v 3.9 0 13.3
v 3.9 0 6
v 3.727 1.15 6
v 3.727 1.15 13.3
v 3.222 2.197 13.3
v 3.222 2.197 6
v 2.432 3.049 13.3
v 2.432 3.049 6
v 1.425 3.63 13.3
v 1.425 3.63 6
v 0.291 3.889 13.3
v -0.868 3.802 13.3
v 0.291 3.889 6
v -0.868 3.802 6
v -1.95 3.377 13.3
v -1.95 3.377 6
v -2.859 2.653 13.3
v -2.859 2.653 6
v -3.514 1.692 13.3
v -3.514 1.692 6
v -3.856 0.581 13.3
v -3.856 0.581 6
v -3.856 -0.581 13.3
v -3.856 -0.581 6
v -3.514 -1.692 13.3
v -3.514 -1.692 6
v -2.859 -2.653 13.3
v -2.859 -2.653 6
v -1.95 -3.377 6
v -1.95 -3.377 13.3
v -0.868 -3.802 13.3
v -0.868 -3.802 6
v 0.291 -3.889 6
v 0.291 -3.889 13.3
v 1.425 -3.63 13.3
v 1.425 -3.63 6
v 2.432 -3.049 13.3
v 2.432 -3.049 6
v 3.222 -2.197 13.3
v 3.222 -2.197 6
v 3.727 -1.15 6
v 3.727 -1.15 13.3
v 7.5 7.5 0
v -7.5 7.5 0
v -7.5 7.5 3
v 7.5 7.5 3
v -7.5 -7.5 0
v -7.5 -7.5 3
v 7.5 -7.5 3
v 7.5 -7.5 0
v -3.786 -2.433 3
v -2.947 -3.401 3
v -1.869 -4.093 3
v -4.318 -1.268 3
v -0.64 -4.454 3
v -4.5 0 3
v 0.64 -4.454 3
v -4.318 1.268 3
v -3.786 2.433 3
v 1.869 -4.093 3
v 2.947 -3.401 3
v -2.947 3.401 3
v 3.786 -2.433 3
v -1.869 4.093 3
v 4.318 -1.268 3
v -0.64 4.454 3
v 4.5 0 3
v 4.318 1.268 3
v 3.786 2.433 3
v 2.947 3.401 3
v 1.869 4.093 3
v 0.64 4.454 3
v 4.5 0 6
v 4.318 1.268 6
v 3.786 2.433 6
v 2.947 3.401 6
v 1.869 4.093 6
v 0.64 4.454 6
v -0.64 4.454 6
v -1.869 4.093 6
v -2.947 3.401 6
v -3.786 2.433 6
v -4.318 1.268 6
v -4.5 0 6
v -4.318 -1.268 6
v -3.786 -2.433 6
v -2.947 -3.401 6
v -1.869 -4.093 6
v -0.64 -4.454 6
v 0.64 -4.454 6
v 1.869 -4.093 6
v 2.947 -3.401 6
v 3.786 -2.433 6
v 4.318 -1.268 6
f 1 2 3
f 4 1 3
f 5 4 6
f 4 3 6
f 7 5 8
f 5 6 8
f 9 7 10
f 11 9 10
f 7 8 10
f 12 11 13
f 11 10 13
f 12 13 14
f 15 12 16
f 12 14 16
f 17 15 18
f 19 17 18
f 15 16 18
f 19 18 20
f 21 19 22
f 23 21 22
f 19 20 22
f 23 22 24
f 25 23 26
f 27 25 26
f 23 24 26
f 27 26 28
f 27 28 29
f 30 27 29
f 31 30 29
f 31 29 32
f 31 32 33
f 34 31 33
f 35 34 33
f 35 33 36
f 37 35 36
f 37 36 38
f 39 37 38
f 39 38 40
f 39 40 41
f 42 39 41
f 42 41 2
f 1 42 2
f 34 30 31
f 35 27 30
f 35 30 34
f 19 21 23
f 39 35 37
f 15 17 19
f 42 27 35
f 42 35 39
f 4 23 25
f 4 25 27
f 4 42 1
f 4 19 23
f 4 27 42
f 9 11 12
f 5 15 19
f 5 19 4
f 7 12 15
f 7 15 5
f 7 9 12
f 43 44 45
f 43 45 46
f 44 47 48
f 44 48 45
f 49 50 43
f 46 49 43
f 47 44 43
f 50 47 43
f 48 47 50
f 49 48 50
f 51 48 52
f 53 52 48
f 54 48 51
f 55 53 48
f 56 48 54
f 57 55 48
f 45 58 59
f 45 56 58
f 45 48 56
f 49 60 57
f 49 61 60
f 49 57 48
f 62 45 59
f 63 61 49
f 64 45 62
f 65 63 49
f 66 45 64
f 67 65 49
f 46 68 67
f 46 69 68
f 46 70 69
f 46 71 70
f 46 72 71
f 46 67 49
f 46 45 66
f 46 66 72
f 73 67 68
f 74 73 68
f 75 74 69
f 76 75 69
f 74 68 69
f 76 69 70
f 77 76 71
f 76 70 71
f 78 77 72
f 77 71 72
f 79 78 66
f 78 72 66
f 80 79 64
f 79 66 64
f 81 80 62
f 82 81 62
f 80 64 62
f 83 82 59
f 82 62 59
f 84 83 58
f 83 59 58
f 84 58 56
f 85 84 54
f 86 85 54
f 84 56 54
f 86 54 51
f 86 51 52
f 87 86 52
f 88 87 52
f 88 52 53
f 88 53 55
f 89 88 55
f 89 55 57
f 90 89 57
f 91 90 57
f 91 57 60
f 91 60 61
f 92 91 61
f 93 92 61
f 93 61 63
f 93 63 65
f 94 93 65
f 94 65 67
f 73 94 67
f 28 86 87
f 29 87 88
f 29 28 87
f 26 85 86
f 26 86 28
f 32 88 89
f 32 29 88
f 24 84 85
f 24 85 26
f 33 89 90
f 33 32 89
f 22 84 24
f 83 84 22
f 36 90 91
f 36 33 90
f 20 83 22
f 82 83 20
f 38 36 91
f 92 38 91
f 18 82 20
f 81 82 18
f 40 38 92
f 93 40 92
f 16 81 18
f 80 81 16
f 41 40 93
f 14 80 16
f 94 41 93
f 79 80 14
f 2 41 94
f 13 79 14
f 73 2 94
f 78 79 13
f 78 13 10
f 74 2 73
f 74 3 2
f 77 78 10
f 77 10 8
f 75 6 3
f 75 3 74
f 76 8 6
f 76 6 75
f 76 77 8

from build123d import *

# Parameters (mm, degrees)
F0_W     = 15
F0_H     = 15
F0_R     = 4.5
F1_DEPTH = 3
F0_R_2   = 3.9
F2_DEPTH = 6
F3_DEPTH = 13.3


with BuildPart() as f1:
    # F0 (on Top) → F1 (new body)
    with BuildSketch(Plane.XY):
        Rectangle(F0_W, F0_H)
        Circle(F0_R, mode=Mode.SUBTRACT)
    extrude(amount=F1_DEPTH)

    # F0 (on Top) → F2 (join)
    with BuildSketch(Plane.XY):
        Circle(F0_R)
        Circle(F0_R_2, mode=Mode.SUBTRACT)
    extrude(amount=F2_DEPTH)

    # F0 (on Top) → F3 (join)
    with BuildSketch(Plane.XY):
        Circle(F0_R_2)
    extrude(amount=F3_DEPTH)


solid = f1.part
